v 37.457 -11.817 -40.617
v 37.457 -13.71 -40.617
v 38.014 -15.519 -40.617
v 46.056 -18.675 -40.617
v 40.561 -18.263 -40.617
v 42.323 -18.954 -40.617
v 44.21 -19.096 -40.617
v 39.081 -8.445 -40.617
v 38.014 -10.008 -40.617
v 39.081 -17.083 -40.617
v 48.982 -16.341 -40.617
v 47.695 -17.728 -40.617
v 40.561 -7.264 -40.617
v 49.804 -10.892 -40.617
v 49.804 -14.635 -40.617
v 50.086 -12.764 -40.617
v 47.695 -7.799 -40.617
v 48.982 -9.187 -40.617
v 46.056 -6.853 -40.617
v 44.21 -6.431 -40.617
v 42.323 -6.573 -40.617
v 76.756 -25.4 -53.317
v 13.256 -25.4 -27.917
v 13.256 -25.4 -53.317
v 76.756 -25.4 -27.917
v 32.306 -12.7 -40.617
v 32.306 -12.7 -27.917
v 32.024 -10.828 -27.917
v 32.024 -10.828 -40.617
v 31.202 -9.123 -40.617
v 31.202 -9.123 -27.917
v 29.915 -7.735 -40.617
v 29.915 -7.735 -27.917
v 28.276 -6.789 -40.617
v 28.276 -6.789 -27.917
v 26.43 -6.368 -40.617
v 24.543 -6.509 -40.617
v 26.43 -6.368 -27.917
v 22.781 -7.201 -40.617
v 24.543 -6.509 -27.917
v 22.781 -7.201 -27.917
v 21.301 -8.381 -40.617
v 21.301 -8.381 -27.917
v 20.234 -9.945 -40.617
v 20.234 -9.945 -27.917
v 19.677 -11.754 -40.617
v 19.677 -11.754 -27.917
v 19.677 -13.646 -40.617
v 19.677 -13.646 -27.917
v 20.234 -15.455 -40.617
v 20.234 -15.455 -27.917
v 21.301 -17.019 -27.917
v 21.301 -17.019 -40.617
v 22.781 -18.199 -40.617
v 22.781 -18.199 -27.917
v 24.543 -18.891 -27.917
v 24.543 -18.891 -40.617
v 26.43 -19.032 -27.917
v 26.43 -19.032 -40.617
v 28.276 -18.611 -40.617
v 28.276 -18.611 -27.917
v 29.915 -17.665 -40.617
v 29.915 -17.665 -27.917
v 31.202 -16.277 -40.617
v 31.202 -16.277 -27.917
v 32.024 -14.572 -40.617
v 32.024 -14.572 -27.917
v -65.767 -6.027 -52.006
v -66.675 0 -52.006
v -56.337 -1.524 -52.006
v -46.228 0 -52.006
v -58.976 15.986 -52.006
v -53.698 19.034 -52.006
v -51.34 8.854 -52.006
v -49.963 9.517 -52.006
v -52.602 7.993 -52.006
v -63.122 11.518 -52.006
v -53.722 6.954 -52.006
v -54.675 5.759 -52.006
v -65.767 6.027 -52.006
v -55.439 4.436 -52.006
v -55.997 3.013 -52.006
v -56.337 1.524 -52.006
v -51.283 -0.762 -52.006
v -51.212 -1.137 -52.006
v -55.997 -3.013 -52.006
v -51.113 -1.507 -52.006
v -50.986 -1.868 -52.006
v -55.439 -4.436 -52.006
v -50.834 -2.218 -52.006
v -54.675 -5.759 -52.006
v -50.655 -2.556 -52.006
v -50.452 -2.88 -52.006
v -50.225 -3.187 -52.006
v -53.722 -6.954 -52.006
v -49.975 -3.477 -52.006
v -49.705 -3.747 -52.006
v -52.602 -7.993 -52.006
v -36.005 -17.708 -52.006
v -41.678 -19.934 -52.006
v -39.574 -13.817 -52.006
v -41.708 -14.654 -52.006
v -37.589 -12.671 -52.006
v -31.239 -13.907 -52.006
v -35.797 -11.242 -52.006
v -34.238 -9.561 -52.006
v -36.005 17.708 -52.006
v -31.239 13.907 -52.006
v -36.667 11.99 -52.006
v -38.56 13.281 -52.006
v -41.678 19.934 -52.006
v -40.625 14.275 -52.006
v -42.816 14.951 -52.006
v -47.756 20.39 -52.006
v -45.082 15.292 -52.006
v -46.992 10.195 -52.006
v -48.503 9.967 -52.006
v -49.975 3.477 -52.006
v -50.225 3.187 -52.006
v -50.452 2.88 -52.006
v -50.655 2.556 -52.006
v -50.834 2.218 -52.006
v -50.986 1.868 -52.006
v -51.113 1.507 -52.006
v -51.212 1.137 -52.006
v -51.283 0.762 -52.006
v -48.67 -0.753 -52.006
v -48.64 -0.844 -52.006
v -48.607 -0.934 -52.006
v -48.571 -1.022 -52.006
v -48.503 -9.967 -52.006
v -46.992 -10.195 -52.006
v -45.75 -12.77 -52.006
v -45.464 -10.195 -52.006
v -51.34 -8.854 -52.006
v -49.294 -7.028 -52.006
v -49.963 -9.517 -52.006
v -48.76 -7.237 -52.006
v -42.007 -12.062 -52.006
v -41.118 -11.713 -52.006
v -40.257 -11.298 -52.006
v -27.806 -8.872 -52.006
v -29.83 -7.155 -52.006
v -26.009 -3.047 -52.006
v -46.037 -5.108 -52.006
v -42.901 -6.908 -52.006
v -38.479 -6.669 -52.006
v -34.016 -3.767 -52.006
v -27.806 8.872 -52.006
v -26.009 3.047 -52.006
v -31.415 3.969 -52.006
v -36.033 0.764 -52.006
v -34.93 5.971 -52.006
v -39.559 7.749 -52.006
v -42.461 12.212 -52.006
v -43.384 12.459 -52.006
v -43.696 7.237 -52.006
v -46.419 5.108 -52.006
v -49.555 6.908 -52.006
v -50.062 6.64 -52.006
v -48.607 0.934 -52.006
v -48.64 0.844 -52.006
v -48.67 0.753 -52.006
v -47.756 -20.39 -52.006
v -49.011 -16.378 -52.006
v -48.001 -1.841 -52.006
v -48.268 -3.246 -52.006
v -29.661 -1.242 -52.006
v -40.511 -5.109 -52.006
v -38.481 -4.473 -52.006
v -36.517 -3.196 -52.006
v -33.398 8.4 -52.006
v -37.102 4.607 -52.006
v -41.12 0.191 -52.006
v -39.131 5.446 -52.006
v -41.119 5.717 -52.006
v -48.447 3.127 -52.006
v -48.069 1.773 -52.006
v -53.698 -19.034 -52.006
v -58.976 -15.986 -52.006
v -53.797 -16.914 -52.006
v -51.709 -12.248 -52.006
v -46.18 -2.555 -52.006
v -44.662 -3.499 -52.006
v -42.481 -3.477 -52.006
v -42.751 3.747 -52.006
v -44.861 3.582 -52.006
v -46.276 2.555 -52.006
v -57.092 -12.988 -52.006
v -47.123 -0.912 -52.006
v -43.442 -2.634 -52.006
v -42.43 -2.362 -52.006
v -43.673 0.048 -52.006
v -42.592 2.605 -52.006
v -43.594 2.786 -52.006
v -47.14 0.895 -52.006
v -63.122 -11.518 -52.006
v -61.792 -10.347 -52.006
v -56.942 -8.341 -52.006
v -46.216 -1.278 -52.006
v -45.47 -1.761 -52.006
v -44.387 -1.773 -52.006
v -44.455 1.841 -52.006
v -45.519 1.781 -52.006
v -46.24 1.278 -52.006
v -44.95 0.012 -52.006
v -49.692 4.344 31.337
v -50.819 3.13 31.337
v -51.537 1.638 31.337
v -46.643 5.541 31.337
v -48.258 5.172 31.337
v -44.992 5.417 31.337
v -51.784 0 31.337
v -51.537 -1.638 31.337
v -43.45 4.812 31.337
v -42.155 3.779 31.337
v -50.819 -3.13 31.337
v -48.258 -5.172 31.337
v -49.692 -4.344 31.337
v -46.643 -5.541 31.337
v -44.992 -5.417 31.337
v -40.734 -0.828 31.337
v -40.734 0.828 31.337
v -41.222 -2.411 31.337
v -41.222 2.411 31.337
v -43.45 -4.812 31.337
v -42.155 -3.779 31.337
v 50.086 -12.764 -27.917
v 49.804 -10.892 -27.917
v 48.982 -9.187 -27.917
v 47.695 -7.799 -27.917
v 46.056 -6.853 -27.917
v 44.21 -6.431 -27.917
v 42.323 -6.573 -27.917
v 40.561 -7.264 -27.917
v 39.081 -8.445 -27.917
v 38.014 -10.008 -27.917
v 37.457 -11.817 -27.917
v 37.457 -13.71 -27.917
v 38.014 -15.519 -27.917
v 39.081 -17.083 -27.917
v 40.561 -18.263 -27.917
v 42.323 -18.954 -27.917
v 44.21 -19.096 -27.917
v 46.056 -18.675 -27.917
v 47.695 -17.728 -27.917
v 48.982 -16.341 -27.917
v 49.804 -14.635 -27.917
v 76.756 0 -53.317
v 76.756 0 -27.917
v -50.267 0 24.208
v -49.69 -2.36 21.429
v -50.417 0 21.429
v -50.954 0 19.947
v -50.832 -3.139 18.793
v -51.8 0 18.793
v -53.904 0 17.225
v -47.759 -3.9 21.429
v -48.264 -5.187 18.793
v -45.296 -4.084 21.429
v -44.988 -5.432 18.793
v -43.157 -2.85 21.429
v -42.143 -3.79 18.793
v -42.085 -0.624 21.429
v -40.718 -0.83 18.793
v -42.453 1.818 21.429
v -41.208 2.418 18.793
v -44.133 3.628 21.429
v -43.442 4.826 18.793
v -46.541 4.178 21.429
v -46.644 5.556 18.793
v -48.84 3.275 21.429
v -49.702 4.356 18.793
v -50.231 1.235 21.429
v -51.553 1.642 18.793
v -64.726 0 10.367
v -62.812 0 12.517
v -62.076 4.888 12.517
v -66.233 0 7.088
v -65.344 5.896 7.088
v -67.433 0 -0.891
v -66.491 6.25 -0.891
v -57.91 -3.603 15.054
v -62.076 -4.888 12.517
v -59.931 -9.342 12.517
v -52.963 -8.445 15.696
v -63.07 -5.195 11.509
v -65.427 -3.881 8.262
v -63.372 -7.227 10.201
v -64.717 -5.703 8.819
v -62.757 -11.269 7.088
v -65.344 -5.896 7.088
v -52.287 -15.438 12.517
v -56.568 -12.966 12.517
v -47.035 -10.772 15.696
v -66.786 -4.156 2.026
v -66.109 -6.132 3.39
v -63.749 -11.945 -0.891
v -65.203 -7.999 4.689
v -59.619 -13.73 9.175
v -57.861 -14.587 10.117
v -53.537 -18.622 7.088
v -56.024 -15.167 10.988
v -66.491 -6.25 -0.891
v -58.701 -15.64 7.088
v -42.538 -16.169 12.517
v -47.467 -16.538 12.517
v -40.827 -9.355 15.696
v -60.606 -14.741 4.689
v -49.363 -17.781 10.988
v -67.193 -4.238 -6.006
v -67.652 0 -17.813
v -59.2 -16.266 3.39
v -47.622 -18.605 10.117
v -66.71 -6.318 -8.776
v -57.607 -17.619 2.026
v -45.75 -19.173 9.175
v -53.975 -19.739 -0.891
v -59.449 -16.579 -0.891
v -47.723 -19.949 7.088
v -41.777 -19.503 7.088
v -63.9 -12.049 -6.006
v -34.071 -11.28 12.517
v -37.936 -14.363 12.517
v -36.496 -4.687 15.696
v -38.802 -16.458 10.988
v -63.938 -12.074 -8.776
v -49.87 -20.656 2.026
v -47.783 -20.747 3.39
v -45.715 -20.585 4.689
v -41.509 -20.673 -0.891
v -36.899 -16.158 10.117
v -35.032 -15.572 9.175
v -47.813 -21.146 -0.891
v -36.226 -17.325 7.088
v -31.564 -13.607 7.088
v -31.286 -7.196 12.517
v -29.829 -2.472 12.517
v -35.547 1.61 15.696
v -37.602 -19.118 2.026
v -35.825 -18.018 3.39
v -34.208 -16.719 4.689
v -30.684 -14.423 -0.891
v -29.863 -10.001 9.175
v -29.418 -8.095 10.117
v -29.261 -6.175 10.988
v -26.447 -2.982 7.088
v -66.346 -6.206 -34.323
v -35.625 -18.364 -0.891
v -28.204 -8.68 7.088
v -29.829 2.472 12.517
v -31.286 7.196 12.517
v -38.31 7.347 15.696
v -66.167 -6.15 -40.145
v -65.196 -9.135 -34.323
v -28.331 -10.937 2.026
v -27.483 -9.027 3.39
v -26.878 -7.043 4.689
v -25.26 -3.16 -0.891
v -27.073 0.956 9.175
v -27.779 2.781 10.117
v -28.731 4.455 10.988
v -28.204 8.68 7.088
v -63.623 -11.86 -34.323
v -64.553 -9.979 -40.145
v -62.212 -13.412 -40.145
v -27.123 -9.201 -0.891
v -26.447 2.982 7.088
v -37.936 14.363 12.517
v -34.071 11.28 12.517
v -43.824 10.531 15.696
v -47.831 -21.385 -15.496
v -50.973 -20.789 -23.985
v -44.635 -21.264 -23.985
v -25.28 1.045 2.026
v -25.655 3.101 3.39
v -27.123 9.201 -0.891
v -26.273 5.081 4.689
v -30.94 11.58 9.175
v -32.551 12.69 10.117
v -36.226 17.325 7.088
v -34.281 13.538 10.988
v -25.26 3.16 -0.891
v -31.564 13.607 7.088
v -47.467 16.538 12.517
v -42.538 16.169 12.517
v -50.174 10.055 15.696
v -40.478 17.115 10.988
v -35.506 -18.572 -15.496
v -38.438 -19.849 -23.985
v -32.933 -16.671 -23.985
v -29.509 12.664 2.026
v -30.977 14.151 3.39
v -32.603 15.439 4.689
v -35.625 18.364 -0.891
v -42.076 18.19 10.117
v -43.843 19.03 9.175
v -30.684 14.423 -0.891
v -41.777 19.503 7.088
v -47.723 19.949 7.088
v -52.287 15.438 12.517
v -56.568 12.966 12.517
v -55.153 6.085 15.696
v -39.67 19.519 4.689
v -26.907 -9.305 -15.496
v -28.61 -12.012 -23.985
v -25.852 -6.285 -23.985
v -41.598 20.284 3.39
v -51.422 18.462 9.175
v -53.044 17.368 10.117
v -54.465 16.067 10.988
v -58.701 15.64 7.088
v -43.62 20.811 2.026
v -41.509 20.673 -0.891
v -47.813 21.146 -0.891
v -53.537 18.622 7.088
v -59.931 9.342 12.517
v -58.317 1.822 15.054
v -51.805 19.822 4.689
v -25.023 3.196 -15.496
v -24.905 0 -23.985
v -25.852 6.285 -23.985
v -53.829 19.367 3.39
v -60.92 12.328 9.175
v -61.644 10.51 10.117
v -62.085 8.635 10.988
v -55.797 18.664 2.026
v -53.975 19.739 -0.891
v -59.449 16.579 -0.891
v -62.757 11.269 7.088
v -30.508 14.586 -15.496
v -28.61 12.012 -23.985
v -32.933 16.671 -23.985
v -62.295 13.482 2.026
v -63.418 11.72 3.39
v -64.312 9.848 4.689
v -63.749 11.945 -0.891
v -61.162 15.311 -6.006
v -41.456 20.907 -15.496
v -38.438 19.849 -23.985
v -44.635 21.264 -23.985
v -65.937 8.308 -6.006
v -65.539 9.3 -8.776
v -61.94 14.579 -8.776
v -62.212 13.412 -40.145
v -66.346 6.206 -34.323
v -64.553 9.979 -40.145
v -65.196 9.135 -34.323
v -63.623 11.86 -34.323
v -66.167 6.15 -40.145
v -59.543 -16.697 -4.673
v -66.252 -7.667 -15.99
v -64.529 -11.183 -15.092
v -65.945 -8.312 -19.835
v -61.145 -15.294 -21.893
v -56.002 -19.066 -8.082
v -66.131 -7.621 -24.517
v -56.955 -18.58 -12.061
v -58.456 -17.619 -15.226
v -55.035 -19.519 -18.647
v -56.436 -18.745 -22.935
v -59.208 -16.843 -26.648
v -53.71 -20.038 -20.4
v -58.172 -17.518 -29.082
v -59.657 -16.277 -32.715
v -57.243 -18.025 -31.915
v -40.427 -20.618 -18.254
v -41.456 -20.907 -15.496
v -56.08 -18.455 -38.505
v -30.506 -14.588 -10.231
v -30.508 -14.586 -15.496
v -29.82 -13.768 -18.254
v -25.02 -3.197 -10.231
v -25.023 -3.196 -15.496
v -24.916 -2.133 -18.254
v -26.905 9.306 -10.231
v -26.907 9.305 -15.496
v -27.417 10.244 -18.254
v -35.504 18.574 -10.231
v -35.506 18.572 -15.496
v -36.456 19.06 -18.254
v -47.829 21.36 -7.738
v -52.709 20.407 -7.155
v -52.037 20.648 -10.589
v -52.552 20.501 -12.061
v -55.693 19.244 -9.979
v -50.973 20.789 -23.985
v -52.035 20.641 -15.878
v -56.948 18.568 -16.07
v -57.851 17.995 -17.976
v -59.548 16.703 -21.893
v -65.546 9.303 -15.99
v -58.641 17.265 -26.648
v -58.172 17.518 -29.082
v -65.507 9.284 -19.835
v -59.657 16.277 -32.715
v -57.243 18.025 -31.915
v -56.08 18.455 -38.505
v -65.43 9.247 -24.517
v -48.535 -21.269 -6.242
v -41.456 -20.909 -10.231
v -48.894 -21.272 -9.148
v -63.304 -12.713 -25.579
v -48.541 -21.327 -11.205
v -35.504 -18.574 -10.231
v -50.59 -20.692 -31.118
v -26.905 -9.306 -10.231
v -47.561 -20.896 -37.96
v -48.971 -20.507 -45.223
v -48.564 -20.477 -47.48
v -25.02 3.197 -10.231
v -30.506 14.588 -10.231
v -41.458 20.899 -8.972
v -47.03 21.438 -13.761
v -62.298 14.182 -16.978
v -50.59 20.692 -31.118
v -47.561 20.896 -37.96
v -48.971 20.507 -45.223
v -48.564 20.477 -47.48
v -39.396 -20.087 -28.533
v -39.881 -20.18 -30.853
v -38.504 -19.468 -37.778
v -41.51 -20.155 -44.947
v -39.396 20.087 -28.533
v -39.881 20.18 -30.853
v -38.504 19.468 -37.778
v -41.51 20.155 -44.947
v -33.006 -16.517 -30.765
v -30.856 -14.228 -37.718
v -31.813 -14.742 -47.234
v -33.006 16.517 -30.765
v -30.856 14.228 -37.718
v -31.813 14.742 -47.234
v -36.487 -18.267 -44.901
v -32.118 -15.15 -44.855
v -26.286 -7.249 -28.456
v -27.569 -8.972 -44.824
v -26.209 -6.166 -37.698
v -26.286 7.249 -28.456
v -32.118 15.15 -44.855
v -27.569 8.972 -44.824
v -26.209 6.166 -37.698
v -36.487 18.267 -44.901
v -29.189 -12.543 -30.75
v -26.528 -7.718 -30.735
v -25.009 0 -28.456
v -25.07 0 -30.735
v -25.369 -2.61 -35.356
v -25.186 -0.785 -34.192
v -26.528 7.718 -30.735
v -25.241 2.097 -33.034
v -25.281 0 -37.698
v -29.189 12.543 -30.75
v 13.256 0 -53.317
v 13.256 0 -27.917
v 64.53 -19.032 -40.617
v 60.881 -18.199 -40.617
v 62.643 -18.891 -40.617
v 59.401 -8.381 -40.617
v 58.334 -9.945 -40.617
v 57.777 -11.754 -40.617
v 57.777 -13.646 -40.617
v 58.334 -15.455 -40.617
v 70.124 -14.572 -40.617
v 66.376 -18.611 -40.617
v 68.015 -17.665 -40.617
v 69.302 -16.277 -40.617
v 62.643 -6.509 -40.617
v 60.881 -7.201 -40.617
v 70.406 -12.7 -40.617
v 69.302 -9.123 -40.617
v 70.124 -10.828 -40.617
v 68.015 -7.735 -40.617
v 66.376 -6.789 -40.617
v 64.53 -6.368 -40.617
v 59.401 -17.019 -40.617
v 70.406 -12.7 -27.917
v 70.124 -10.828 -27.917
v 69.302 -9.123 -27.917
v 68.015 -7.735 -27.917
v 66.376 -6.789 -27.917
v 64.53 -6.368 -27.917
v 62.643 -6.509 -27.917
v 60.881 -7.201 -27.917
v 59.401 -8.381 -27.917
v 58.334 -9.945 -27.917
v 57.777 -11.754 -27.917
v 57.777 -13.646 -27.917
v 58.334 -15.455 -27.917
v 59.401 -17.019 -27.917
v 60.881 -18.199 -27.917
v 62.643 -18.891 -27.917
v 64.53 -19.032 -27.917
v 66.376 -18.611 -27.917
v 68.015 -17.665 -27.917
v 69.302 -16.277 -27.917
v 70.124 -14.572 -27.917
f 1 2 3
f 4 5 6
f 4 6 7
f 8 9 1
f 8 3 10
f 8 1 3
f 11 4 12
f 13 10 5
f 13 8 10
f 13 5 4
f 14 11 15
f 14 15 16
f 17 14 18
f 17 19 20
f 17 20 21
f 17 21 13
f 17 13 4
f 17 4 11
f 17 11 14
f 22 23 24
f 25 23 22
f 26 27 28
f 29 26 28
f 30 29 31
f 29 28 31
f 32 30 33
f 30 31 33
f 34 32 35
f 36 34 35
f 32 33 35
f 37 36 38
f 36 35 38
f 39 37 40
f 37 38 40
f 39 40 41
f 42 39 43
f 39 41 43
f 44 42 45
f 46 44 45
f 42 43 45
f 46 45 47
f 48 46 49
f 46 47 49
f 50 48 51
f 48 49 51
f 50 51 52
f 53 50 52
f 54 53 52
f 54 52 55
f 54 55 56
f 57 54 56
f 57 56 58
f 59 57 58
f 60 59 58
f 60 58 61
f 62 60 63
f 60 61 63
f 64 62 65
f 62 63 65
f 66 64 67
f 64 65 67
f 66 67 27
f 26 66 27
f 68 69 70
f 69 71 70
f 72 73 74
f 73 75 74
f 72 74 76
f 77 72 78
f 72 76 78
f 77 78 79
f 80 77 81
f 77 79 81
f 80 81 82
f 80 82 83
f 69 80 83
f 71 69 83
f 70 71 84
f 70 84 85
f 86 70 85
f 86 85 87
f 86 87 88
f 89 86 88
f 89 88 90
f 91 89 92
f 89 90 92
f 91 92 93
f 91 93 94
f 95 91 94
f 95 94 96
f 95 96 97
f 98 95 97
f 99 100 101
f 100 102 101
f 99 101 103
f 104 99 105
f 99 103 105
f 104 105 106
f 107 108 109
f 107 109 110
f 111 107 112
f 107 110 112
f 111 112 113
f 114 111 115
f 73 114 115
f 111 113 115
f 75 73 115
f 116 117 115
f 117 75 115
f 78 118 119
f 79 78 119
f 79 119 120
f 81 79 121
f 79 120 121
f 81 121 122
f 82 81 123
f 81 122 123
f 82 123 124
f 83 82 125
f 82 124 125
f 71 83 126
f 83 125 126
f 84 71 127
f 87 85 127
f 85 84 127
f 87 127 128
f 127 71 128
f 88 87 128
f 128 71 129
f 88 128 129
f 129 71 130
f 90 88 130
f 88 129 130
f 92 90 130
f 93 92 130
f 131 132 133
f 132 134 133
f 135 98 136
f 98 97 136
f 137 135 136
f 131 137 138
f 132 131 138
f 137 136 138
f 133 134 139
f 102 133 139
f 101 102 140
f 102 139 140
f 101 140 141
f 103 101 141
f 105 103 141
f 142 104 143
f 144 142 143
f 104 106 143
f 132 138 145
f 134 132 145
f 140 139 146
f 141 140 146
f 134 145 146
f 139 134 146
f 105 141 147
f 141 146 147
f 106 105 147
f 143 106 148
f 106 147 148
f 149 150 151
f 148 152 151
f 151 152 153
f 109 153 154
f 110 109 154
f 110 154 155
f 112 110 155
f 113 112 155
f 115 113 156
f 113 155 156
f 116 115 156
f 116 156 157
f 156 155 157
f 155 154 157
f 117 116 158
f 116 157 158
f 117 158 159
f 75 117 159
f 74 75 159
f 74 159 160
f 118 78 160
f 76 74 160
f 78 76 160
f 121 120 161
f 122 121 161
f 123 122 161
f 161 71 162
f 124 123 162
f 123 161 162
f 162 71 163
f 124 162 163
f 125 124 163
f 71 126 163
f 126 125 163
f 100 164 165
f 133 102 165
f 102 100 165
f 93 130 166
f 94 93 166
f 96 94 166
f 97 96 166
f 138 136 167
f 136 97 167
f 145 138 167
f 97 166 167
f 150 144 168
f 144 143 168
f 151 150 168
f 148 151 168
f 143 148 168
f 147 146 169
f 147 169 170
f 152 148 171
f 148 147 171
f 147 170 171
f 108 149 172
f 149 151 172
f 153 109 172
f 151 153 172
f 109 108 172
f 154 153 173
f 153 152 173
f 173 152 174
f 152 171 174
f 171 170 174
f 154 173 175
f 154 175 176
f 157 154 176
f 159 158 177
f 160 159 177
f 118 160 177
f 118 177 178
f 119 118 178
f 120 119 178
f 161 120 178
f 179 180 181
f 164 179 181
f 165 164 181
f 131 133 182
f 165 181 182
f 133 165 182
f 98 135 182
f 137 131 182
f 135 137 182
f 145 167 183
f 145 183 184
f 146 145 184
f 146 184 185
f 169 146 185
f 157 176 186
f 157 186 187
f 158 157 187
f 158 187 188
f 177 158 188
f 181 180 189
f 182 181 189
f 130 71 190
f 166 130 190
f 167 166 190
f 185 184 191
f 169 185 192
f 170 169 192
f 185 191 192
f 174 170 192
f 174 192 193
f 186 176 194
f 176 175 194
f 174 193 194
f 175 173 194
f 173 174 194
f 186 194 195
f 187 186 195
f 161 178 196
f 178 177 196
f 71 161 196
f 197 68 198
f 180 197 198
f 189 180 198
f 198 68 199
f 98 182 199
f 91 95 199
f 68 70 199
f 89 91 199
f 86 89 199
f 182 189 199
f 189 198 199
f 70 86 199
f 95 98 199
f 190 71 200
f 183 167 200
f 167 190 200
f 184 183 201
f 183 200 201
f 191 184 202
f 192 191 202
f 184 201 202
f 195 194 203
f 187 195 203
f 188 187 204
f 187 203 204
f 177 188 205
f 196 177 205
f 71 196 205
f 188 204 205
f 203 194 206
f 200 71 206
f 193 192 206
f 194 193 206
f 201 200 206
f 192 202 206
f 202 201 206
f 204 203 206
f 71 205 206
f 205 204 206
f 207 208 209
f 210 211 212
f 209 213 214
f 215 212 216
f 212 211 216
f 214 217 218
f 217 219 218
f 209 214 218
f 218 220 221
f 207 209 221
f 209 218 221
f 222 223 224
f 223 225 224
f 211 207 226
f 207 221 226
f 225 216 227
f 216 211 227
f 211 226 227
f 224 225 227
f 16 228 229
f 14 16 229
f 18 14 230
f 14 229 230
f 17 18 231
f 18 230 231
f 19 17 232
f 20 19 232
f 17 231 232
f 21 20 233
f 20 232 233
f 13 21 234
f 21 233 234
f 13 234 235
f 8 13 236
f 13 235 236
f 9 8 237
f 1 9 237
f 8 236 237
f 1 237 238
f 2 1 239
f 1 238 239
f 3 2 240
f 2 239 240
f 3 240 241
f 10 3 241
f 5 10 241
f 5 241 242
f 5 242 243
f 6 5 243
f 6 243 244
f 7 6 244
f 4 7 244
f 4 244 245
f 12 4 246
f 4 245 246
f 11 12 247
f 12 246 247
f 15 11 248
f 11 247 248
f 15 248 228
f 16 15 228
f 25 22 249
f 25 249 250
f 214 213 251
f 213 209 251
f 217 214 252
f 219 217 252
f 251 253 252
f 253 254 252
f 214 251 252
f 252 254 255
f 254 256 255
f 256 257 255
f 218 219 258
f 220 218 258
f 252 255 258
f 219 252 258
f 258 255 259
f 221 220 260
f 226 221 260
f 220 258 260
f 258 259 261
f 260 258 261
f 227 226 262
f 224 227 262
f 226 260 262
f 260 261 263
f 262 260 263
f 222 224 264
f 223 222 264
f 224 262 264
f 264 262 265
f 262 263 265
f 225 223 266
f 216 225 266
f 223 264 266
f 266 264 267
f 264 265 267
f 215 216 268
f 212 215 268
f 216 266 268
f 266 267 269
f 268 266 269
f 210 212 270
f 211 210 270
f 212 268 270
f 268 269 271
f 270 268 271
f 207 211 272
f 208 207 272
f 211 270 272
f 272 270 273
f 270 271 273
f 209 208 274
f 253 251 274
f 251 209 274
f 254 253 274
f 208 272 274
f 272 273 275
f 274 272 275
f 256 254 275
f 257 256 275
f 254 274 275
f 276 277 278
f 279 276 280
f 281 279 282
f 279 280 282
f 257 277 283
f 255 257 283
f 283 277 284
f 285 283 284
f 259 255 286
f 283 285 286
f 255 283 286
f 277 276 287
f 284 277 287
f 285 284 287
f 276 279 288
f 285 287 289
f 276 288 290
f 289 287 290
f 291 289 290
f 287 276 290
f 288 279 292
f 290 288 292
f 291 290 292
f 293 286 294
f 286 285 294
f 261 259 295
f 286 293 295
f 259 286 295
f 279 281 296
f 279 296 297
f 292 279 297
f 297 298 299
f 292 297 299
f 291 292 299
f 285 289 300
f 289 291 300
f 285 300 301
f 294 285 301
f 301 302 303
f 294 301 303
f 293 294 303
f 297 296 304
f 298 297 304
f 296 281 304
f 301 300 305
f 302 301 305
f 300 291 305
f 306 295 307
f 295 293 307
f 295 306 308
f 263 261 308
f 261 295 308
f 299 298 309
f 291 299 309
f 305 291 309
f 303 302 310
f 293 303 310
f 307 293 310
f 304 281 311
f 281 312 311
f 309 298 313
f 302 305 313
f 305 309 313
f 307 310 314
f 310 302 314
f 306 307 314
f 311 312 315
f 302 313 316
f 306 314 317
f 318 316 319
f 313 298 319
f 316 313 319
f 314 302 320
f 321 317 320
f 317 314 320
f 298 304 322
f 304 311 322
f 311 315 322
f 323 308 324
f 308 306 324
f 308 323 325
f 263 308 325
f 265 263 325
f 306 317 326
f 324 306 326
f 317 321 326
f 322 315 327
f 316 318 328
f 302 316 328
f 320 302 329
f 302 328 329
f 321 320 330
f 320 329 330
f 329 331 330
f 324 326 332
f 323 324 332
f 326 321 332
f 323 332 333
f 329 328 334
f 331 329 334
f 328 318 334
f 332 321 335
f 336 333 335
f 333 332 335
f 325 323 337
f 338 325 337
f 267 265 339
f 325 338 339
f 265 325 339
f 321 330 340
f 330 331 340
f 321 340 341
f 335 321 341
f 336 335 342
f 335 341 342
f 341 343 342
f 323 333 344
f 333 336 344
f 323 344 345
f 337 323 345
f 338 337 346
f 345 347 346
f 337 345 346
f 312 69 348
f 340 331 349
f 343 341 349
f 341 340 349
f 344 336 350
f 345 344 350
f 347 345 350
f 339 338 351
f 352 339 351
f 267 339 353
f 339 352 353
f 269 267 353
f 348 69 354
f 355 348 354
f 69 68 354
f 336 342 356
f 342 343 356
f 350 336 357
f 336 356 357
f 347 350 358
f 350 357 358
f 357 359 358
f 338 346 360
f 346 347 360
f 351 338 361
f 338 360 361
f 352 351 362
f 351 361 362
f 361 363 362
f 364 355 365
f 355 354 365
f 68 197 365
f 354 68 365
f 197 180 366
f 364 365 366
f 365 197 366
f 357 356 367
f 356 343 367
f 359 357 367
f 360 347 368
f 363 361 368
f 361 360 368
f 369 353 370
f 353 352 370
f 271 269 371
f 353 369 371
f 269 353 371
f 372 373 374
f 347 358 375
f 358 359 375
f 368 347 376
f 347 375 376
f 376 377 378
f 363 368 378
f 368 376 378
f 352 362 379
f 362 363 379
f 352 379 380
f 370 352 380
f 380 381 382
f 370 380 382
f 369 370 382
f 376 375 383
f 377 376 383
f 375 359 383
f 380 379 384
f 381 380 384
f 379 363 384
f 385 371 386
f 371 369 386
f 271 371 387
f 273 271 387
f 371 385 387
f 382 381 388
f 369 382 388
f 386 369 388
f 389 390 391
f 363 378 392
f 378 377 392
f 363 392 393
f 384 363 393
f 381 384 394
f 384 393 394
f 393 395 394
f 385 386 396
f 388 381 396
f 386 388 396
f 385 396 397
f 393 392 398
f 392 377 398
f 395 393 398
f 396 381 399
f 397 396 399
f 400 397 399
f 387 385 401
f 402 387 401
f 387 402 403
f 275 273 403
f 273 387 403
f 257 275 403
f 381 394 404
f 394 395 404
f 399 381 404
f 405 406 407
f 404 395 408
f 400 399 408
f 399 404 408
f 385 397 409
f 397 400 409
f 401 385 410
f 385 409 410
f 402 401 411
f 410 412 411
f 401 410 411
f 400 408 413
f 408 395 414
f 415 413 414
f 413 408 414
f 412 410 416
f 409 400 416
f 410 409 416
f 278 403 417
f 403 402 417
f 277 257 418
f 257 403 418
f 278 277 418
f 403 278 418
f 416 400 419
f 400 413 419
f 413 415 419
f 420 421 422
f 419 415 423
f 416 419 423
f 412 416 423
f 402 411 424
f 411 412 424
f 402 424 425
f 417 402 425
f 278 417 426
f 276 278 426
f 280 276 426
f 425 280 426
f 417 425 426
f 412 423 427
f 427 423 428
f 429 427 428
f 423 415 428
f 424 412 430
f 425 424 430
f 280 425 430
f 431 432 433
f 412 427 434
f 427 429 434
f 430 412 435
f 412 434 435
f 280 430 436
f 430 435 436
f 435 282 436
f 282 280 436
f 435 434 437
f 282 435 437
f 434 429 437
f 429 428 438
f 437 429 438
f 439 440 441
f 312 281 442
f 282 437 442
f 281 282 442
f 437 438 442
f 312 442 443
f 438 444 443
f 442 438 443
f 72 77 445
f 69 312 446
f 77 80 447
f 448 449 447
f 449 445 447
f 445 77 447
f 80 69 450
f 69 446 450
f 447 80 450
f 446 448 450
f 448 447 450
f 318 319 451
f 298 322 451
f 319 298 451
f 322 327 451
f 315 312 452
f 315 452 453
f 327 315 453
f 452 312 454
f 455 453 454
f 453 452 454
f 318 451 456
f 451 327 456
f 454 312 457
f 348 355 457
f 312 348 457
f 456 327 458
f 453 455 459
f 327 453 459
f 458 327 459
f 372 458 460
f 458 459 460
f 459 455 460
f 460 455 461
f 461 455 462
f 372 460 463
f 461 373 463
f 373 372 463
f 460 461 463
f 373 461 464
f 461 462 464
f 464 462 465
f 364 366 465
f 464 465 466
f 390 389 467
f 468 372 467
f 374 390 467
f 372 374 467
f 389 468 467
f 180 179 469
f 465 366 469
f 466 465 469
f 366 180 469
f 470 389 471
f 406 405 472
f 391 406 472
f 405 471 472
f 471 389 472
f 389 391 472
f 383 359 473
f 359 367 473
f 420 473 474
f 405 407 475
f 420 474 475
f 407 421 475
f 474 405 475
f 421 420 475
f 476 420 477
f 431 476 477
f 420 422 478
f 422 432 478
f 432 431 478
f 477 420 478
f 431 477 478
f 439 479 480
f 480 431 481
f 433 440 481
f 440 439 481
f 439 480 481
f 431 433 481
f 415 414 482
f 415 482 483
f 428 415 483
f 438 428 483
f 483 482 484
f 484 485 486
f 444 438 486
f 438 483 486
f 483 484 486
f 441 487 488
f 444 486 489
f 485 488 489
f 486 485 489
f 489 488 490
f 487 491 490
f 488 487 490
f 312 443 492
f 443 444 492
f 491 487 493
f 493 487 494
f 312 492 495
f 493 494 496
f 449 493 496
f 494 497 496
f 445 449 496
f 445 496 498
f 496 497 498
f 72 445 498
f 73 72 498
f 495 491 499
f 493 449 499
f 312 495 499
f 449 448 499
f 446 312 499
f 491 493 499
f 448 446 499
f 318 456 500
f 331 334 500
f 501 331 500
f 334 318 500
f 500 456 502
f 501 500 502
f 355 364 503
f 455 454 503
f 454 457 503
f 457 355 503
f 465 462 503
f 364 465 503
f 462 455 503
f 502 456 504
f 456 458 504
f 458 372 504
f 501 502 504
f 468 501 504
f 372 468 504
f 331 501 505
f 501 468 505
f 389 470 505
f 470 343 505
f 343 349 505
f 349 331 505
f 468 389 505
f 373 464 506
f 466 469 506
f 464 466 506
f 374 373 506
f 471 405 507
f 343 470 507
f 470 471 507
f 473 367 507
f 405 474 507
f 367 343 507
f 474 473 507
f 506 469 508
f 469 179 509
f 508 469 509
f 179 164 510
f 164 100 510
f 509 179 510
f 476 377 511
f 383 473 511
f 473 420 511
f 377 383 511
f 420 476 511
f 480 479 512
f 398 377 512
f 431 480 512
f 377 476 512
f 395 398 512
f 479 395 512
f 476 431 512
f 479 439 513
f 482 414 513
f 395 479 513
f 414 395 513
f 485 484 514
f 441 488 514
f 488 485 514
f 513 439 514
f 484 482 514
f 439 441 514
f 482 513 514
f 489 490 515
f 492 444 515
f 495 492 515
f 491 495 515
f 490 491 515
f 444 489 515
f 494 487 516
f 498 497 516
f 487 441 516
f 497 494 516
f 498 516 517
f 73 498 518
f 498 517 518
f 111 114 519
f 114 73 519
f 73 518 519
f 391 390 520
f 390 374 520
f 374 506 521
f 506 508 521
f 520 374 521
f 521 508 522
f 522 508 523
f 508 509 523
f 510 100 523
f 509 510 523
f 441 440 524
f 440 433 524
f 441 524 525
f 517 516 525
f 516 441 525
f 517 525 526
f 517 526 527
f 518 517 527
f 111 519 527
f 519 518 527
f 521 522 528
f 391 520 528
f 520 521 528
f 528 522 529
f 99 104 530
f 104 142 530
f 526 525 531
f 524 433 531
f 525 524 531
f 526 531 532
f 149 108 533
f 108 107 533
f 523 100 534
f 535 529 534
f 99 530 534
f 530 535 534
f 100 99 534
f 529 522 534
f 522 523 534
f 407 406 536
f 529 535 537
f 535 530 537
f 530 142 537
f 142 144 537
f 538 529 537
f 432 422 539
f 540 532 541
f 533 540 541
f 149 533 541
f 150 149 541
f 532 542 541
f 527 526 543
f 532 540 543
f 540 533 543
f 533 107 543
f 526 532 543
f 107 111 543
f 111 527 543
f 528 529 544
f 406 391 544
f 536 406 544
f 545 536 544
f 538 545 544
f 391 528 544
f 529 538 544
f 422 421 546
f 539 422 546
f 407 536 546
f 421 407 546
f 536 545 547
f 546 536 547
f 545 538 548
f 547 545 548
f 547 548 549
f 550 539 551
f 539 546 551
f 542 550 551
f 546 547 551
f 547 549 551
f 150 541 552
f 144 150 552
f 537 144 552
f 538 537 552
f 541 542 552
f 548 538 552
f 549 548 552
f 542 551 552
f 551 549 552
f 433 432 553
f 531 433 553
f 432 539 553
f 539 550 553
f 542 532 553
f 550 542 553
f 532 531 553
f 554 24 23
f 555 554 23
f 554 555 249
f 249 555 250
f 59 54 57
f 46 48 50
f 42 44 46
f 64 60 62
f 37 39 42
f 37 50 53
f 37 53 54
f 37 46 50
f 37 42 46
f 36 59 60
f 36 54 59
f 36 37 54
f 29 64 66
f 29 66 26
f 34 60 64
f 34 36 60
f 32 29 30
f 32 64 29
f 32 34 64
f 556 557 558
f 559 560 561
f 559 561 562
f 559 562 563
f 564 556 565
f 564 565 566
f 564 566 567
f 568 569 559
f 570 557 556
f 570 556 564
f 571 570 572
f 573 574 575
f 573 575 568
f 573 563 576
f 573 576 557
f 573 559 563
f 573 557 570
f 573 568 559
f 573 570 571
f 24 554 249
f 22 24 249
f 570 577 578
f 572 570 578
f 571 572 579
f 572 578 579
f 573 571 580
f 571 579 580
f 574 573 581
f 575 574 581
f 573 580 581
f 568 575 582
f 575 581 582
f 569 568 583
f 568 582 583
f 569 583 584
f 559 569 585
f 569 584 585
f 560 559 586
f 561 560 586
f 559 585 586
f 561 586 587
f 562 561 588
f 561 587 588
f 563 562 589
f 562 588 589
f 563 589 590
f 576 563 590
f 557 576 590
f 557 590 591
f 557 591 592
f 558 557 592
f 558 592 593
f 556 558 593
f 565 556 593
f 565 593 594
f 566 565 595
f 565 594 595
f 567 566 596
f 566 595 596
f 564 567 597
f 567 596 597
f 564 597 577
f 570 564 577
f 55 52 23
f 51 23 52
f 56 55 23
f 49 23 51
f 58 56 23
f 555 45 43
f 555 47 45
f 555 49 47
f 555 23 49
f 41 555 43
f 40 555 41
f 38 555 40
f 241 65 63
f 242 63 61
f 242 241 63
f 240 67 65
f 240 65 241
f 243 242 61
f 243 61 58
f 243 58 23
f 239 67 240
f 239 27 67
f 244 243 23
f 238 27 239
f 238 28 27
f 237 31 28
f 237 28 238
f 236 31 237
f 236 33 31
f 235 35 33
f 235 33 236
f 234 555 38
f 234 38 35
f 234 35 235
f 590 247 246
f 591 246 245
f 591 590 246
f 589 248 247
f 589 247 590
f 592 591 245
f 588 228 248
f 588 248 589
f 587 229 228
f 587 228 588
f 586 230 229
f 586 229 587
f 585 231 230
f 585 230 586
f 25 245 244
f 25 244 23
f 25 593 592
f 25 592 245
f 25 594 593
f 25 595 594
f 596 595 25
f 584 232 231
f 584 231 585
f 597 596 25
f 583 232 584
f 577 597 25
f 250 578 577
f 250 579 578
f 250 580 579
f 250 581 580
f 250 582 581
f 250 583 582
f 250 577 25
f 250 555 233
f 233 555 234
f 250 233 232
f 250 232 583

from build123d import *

# Parameters (mm, degrees)
F5_W     = 63.5
F5_H     = 25.4
F6_DEPTH = 25.4
F7_R     = 6.35
F8_DEPTH = 12.7


# Not quite as in the source:
# - a feature of the source that left no trace in its solid (it failed there, or was rolled back) is left out


with BuildPart() as f4:
    # F3 (on Front) → F4 (revolve)
    with BuildSketch(Plane.XZ):
        with BuildLine():
            Line((-46.2280027568, 31.3372500241), (-51.7842508852, 31.3372500241))
            add(Edge.make_bspline(
                [(-51.7842508852, 31.3372500241), (-50.5211565441, 26.7471574214), (-47.9211324049, 17.2986537112), (-66.2013951665, 14.212463315), (-68.335106942, -6.0060096659), (-67.3143122563, -34.2915675348), (-66.6749998927, -52.0064979792)],
                knots=[0, 0, 0, 0, 0.1904381048, 0.3920084616, 0.6192216585, 1, 1, 1, 1], degree=3))
            add(Edge.make_bspline(
                [(-66.6749998927, -52.0064979792), (-59.8593341808, -52.0064979792), (-53.0436684688, -52.0064979792), (-46.2280027568, -52.0064979792)],
                knots=[0, 0, 0, 0, 20.4469971359, 20.4469971359, 20.4469971359, 20.4469971359], degree=3))
            Line((-46.2280027568, -52.0064979792), (-46.2280027568, 31.3372500241))
        make_face()
    revolve(axis=Axis((-46.2280027568, 0, -10.3346239775), (0, 0, 1)))


with BuildPart() as f6:
    # F5 (on Front) → F6 (new body)
    with BuildSketch(Plane.XZ):
        with Locations((45.0056269765, -40.6170164633)):
            Rectangle(F5_W, F5_H)
    extrude(amount=F6_DEPTH)

    # F7 (on face) → F8 (cut)
    with BuildSketch(Plane.XY.offset(-27.9170164633)):
        with Locations((25.9556269765, -12.7)):
            Circle(F7_R)
        with Locations((43.7356269765, -12.7636595487)):
            Circle(F7_R)
        with Locations((64.0556269765, -12.7)):
            Circle(F7_R)
    extrude(amount=-F8_DEPTH, mode=Mode.SUBTRACT)


solid = Compound([f4.part, f6.part])
